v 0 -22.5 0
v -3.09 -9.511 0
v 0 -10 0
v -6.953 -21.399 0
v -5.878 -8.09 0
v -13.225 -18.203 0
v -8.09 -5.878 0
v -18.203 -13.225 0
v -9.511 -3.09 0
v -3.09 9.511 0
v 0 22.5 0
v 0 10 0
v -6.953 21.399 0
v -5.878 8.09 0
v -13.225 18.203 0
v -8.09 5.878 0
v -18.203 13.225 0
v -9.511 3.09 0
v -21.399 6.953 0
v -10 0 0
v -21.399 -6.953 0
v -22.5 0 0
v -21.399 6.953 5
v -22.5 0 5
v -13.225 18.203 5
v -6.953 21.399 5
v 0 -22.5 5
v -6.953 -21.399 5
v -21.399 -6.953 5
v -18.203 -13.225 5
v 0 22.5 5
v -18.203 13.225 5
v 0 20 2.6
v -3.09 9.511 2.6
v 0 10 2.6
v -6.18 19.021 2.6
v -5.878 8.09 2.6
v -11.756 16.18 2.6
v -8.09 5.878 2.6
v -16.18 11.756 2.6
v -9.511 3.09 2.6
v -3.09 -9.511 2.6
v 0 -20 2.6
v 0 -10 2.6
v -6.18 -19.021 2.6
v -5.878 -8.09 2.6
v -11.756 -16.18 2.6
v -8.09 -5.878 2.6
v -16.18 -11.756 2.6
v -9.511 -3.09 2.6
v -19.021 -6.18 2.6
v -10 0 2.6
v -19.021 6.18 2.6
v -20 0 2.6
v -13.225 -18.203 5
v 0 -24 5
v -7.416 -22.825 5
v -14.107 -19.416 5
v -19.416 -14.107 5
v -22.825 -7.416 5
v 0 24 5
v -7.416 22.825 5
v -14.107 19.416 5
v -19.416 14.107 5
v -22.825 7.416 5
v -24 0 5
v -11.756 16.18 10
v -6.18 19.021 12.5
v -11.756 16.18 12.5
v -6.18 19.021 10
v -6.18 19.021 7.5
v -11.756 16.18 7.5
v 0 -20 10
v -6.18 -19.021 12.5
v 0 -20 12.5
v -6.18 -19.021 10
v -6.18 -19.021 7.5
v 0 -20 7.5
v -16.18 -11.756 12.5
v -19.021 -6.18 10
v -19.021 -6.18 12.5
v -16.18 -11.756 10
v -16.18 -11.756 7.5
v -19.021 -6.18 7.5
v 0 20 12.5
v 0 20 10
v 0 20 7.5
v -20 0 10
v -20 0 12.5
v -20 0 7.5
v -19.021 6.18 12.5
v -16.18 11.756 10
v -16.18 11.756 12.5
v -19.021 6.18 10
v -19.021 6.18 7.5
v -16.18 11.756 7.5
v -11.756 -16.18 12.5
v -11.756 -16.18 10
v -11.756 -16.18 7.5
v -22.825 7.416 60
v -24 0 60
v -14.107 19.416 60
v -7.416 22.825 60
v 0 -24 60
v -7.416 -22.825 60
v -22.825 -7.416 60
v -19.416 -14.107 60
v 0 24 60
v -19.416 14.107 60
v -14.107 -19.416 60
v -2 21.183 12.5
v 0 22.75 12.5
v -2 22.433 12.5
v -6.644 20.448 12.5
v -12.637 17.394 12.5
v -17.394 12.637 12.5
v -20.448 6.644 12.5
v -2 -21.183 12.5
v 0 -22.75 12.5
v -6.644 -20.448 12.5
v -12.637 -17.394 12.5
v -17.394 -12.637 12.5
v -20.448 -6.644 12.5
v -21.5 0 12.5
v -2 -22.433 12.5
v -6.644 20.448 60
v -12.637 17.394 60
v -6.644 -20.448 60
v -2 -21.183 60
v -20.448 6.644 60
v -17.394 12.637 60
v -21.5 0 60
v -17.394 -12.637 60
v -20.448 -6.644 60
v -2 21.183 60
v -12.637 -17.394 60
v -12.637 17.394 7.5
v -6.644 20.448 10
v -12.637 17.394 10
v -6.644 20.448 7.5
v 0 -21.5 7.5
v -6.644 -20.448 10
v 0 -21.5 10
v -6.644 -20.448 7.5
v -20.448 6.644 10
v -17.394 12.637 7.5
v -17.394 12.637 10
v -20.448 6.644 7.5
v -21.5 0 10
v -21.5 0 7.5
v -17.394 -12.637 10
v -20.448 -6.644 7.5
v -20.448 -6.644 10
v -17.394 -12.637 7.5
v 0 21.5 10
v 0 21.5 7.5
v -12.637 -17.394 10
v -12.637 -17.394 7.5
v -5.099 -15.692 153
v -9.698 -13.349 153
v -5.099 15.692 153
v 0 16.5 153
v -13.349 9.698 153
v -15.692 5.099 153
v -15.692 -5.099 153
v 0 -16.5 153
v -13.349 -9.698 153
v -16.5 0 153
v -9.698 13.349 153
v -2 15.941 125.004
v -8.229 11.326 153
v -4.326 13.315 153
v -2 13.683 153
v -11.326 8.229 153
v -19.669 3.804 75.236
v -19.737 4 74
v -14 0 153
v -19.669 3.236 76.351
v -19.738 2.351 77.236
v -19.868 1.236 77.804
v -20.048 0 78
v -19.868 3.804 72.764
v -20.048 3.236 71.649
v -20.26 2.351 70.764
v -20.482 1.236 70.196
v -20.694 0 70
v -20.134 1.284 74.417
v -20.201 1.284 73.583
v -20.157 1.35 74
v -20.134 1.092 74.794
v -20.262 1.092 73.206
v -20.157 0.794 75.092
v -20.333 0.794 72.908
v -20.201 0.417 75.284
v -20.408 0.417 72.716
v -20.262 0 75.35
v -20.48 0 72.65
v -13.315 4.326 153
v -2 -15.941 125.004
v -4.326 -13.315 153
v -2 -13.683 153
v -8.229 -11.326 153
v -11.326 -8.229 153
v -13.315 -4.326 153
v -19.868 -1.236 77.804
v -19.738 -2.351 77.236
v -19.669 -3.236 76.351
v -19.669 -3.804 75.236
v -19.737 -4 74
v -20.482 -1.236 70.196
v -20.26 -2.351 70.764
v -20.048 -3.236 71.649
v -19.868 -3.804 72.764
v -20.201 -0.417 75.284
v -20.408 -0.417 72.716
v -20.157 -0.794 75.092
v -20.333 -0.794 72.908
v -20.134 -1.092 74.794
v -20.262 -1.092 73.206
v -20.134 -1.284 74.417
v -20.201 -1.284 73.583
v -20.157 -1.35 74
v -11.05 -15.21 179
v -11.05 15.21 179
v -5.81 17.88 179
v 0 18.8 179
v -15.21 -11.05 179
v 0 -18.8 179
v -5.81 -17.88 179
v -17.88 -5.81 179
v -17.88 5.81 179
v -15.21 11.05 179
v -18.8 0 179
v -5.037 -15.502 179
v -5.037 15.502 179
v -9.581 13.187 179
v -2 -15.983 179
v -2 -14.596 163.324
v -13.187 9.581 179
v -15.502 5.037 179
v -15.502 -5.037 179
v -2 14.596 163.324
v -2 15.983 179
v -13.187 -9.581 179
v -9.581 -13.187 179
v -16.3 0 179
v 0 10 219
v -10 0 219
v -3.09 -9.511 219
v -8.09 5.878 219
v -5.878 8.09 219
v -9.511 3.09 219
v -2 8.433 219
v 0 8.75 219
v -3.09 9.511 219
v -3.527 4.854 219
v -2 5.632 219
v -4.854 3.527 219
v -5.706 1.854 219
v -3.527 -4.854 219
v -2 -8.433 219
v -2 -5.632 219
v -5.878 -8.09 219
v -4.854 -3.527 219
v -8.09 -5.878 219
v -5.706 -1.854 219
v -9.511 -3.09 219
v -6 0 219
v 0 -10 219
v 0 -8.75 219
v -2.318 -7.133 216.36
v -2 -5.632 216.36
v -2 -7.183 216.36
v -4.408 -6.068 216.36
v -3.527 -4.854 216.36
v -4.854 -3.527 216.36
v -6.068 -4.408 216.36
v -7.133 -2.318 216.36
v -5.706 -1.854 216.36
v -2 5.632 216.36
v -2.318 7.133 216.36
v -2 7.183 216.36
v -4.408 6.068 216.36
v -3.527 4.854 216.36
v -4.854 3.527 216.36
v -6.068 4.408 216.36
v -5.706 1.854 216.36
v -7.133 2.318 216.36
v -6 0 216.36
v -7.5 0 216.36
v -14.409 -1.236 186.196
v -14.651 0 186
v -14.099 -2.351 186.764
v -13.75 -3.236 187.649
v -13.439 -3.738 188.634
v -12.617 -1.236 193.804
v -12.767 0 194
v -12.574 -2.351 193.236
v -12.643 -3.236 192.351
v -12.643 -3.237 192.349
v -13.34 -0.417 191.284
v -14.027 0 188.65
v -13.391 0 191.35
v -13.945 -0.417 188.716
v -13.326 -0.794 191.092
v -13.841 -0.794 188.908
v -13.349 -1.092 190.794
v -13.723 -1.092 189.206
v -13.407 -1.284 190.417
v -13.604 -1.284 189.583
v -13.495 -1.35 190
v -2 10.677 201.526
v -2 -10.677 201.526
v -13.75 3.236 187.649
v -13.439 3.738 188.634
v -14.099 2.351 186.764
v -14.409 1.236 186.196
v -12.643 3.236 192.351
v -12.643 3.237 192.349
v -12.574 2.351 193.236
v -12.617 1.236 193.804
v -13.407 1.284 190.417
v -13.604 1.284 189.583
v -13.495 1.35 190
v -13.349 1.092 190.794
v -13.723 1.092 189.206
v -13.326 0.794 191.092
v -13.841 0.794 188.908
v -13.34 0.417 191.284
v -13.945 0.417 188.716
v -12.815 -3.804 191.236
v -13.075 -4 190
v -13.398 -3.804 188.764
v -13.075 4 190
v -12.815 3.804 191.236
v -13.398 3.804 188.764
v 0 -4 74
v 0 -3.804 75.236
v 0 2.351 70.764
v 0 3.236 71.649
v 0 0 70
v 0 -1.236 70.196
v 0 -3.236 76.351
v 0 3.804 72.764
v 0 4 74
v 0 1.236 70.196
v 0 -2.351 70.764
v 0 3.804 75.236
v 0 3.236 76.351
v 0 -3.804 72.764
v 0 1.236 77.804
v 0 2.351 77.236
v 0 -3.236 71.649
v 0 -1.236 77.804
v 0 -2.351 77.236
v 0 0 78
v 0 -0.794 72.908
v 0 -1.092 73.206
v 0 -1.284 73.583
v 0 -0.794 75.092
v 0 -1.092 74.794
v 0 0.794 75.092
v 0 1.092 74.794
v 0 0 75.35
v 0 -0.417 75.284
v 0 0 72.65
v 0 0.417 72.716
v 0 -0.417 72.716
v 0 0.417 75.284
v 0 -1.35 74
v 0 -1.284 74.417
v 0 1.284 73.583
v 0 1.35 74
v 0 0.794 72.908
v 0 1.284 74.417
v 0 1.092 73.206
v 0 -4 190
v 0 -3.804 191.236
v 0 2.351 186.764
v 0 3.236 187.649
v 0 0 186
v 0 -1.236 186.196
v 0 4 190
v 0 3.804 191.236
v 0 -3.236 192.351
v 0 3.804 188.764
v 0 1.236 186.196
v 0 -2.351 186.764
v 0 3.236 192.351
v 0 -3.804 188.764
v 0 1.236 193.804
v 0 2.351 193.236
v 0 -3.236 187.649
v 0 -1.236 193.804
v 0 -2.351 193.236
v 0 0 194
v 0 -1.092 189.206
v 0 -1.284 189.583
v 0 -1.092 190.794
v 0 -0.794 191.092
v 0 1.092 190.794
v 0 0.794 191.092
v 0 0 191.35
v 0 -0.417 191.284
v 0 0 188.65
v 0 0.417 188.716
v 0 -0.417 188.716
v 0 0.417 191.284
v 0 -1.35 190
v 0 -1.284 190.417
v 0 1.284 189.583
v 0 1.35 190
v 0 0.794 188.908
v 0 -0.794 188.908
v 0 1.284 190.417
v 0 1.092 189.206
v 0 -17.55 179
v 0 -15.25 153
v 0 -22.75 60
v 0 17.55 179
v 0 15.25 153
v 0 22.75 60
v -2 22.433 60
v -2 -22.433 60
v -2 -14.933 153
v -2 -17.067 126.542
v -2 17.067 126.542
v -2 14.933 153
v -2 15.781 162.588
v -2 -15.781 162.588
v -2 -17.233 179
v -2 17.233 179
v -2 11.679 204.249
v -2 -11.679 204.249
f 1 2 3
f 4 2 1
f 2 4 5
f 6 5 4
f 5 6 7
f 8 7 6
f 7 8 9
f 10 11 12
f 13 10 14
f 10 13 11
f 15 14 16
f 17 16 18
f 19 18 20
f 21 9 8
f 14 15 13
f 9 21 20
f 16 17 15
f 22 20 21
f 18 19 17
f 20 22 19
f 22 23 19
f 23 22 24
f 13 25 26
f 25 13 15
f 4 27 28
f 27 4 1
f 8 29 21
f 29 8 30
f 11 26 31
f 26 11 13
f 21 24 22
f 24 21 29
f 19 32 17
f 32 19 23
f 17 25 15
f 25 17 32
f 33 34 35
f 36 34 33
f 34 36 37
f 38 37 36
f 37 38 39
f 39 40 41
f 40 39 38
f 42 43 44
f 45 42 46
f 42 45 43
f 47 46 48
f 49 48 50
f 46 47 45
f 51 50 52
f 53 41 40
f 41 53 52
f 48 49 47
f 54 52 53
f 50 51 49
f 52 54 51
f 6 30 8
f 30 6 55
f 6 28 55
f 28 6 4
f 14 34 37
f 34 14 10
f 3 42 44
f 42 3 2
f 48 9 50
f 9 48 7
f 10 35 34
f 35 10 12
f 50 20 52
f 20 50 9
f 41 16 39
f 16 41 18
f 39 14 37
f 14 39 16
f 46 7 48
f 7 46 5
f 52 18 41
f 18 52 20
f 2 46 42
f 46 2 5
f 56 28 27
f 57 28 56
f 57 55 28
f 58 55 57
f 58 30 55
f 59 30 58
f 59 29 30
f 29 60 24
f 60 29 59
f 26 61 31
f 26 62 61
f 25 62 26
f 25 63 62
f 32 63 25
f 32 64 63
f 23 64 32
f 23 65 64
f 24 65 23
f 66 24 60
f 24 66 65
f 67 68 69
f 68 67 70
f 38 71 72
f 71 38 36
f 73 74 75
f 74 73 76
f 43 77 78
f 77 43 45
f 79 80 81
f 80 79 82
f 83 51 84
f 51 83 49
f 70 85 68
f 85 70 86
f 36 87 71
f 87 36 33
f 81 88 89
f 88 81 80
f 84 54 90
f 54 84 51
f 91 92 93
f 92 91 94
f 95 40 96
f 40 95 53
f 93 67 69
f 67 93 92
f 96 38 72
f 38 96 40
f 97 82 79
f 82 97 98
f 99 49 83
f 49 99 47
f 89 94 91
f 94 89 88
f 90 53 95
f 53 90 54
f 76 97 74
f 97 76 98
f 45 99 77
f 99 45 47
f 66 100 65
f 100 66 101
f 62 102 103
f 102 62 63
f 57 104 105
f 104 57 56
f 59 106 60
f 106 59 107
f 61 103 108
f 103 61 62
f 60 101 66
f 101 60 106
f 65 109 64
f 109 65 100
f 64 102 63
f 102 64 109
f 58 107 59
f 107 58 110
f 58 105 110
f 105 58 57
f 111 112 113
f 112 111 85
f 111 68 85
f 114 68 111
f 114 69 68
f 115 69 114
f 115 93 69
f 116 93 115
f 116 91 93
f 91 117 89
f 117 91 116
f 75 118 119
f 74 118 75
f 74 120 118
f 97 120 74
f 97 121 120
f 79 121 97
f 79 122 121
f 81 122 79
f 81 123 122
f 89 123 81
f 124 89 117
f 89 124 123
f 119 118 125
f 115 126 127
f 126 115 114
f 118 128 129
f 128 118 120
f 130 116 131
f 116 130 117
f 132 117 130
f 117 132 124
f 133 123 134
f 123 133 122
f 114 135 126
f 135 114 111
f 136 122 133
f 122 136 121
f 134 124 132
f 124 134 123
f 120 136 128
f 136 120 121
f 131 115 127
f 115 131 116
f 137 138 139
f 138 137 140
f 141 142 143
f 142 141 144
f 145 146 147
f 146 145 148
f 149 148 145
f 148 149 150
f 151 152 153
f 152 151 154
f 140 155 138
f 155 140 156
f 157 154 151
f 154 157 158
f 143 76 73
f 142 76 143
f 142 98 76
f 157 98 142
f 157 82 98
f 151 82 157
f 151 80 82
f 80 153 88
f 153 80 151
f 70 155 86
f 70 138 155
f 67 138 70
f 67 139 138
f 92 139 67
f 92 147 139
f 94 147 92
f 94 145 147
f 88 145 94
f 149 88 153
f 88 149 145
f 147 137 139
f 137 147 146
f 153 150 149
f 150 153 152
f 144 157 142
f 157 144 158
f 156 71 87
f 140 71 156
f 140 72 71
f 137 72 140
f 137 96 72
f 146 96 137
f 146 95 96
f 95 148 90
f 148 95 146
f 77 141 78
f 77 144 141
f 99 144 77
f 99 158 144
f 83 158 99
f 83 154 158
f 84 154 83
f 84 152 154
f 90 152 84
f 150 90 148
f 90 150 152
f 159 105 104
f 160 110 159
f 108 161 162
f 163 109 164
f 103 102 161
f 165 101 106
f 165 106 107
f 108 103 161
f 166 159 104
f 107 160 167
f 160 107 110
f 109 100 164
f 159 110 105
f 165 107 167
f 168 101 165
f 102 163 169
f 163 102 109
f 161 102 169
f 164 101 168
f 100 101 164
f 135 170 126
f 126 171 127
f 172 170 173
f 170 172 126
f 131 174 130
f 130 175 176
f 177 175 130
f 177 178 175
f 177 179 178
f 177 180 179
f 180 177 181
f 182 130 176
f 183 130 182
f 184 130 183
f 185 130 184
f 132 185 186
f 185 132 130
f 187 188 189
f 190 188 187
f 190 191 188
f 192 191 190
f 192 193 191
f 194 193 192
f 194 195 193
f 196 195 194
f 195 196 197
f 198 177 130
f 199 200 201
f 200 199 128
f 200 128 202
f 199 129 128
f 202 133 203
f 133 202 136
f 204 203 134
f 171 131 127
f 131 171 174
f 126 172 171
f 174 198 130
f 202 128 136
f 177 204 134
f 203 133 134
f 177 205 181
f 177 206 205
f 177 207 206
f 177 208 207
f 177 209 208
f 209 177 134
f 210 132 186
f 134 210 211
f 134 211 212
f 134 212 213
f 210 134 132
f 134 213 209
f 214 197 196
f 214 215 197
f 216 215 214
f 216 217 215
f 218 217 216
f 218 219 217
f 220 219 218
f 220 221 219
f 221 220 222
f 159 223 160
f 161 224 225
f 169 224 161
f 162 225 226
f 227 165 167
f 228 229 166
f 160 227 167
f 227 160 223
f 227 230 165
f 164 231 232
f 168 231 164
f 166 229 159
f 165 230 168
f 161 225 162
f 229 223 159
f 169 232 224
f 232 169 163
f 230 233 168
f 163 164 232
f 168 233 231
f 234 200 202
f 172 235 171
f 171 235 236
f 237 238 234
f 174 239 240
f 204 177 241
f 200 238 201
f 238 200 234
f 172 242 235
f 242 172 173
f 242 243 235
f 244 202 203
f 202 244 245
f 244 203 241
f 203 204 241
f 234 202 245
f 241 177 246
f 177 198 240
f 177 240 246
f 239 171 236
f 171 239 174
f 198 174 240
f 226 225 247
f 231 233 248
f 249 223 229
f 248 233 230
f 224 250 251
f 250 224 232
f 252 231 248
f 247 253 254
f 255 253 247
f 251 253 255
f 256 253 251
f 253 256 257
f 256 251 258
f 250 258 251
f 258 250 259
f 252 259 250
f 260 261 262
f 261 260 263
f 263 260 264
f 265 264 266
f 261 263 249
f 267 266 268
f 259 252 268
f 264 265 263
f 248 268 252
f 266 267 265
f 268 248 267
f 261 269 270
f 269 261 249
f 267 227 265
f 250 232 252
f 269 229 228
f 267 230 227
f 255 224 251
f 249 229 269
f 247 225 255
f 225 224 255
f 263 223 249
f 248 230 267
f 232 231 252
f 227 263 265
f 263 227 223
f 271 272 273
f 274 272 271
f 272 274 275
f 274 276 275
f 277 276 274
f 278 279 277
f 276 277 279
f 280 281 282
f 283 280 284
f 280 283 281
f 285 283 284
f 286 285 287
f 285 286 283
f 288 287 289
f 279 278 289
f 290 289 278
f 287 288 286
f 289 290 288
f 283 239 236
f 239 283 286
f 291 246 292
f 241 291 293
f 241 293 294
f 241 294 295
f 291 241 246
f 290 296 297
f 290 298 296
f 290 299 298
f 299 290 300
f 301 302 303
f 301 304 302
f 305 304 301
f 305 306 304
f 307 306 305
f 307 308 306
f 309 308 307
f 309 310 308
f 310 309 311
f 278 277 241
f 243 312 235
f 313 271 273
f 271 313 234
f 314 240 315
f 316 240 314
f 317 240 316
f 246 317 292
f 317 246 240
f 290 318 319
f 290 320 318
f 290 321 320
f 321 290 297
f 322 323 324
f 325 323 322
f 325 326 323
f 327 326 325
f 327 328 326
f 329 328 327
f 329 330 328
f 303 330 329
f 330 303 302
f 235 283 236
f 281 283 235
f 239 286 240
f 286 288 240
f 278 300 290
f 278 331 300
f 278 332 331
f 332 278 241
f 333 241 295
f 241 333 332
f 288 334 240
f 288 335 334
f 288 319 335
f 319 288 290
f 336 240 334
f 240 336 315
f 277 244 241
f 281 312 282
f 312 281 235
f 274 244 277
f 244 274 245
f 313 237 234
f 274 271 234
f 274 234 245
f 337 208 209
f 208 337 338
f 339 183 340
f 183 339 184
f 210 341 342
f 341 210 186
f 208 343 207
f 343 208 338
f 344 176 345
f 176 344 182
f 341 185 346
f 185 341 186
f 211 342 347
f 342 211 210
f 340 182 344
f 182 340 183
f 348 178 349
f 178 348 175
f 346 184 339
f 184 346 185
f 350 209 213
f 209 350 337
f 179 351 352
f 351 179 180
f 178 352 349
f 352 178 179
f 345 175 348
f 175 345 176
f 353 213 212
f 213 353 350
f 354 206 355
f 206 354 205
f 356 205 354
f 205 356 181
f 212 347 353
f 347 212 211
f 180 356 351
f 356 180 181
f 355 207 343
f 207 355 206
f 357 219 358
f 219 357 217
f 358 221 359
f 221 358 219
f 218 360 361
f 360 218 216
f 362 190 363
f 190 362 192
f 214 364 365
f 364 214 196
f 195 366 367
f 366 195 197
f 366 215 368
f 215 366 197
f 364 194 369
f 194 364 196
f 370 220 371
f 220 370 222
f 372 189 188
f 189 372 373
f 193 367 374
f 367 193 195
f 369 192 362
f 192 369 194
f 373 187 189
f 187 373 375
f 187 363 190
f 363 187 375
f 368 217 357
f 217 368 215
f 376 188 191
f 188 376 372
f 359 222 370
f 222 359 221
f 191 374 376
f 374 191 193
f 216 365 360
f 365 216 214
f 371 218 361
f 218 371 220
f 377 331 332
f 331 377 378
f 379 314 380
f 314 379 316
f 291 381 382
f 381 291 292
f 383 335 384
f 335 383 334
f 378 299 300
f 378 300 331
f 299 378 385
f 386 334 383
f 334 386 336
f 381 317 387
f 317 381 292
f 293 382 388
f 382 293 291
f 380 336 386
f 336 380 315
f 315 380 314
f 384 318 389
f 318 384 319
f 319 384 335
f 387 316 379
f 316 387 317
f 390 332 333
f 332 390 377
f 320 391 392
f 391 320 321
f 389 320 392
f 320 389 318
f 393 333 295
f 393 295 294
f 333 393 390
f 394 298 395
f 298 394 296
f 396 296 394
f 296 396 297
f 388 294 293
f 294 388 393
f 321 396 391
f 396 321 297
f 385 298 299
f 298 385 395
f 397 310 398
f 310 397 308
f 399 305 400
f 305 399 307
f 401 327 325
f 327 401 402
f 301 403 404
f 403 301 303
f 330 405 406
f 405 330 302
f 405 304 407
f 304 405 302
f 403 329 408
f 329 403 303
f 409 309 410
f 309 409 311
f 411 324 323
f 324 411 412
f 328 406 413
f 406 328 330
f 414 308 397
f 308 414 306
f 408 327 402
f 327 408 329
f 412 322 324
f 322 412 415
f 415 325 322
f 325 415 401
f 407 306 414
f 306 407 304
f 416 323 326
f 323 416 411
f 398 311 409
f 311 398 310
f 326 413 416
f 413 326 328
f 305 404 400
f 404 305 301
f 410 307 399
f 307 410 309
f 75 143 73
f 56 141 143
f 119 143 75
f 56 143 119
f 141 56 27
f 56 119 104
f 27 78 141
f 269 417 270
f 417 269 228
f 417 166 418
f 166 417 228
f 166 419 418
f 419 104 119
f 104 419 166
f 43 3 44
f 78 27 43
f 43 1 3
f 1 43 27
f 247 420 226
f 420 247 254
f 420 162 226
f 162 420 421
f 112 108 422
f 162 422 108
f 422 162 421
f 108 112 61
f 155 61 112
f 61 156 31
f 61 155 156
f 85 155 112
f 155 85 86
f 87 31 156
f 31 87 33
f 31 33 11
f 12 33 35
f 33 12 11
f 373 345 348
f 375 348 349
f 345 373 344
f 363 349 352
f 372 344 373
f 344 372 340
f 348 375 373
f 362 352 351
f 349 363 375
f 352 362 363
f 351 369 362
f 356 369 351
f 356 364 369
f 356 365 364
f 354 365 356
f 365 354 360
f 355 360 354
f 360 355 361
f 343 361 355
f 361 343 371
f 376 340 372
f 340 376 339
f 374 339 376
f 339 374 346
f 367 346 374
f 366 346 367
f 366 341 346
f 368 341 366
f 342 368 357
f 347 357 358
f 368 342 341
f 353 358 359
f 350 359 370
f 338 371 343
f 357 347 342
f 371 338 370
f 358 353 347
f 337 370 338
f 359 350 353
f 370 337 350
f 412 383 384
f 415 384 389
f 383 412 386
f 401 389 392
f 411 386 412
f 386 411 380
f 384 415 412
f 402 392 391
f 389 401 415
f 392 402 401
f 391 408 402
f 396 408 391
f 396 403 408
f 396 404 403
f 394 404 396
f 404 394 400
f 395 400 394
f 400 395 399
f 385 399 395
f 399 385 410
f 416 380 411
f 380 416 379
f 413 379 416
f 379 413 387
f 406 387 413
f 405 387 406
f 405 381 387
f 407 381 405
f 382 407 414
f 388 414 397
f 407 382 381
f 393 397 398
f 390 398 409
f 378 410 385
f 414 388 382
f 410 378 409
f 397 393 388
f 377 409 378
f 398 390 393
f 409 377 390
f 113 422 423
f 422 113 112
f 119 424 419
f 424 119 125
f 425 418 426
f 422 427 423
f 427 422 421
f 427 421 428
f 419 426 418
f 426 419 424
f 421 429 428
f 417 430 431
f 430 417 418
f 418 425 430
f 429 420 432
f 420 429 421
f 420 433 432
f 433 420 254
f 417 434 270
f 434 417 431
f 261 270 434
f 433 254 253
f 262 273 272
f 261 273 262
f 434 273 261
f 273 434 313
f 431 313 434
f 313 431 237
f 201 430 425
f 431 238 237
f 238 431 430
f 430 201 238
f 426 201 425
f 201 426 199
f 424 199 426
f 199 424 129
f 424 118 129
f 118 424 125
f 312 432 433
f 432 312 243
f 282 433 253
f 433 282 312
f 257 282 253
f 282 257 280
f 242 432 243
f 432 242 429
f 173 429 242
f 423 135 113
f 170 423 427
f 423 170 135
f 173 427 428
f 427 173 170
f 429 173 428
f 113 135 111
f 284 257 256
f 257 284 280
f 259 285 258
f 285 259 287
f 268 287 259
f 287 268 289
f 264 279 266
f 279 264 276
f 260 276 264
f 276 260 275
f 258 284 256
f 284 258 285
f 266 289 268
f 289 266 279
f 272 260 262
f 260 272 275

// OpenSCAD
// How to make things smoother:
// <kintel> Traditionally, the easiest way is to draw half the outline in SVG and rotate_extrude() it in OpenSCAD
// <kintel> you can also do interesting tricks using offset(), but again, that needs to be done in 2D space
// <kintel> ..or finally, minkowski() {your_model(); sphere();} is often a decent trick

$fn = 20;
wall_thickness = 2.5;

motor_shaft_cutout_width = 2.6;
motor_shaft_cutout_radius = 10;

aluminium_ring_section_with = 5;
aluminium_ring_section_radius = 22.5;
aluminium_ring_section_inner_overlap = 2.5;

top_radius = 24;
top_width = 55;

motor_anchor_width = 7.5;
motor_anchor_slit_width = 2.5;
motor_anchor_slit_offeset = 2.5;

grip_cone_width = 93;
grip_cone_bottom_radius = 16.5;

middle_section_cone_width = 26;
middle_section_cone_radius = 18.8; 

bottom_section_cone_width = 40;
bottom_section_cone_radius = 10;

bottom_opening_width = 2.64;
bottom_opening_radius = 6;

button_radius = 8;
button_offset = 95;
button_gap = 17;
button_count = 3;

button_half = false;


screw_holder_radius = 4;
screw_holder_inner_radius = 1.35;

top_screw_holder_heigth = 11;
top_screw_holder_offset = 74;

pcb_screw_holder_z_offset = 150;
pcb_screw_holder_x_offset = -16;

bottom_screw_holder_z_offset = 190;
bottom_screw_holder_x_offset = -15;

difference() {
    union() {
        difference() {
            union() {
                difference() {
                    union() {
                        difference() { // Front plate with motor shaft cutout
                            cylinder(h=motor_shaft_cutout_width, r=aluminium_ring_section_radius);
                            cylinder(h=motor_shaft_cutout_width, r=motor_shaft_cutout_radius);
                        }
                        difference() { // Motor rubber ring cutout
                            translate([0,0,motor_shaft_cutout_width]) cylinder(h=aluminium_ring_section_with - motor_shaft_cutout_width, r=aluminium_ring_section_radius);
                            translate([0,0,motor_shaft_cutout_width]) cylinder(h=aluminium_ring_section_with - motor_shaft_cutout_width, r=aluminium_ring_section_radius - wall_thickness);
                        }
                        difference() { // Top section
                            translate([0,0,aluminium_ring_section_with]) cylinder(h=top_width, r=top_radius);
                            translate([0,0,aluminium_ring_section_with]) cylinder(h=motor_anchor_width, r=aluminium_ring_section_radius - wall_thickness);
                            translate([0,0,aluminium_ring_section_with + motor_anchor_width]) cylinder(h=top_width - motor_anchor_width, r=top_radius - wall_thickness);
                            translate([0,0,aluminium_ring_section_with + motor_anchor_slit_offeset]) cylinder(h=motor_anchor_slit_width, r=top_radius - wall_thickness);
                        }
                        difference() { // Grip cone
                            translate([0,0,aluminium_ring_section_with + top_width]) cylinder(h=grip_cone_width, r1=top_radius, r2=grip_cone_bottom_radius);
                            translate([0,0,aluminium_ring_section_with + top_width]) cylinder(h=grip_cone_width, r1=top_radius - wall_thickness, r2=grip_cone_bottom_radius - wall_thickness);
                        }
                        difference() { // Middle section cone
                            translate([0,0,aluminium_ring_section_with + top_width + grip_cone_width]) cylinder(h=middle_section_cone_width, r1=grip_cone_bottom_radius, r2=middle_section_cone_radius);
                            translate([0,0,aluminium_ring_section_with + top_width + grip_cone_width]) cylinder(h=middle_section_cone_width, r1=grip_cone_bottom_radius - wall_thickness, r2=middle_section_cone_radius - wall_thickness);
                        }
                        difference() { // Bottom section cone
                            translate([0,0,aluminium_ring_section_with + top_width + grip_cone_width + middle_section_cone_width]) cylinder(h=bottom_section_cone_width, r1=middle_section_cone_radius, r2 = bottom_section_cone_radius);
                            translate([0,0,aluminium_ring_section_with + top_width + grip_cone_width + middle_section_cone_width]) cylinder(h=bottom_section_cone_width - bottom_opening_width, r1=middle_section_cone_radius - wall_thickness, r2 = bottom_section_cone_radius - wall_thickness);
                        }
                        if(button_half) { // Screw holders for button half
                            difference() {
                                translate([0 - top_radius + wall_thickness, 0, top_screw_holder_offset]) rotate([0,90,0]) cylinder(h=top_screw_holder_heigth, r=screw_holder_radius);
                                translate([0 - top_radius + wall_thickness, 0, top_screw_holder_offset]) rotate([0,90,0]) cylinder(h=top_screw_holder_heigth, r=screw_holder_inner_radius);
                            }
                            difference() {
                                translate([pcb_screw_holder_x_offset, 0, pcb_screw_holder_z_offset]) rotate([0,90,0]) cylinder(h=top_screw_holder_heigth, r=screw_holder_radius);
                                translate([pcb_screw_holder_x_offset, 0, pcb_screw_holder_z_offset]) rotate([0,90,0]) cylinder(h=top_screw_holder_heigth, r=screw_holder_inner_radius);
                            }
                            difference() {
                                translate([bottom_screw_holder_x_offset, 0, bottom_screw_holder_z_offset]) rotate([0,90,0]) cylinder(h=top_screw_holder_heigth, r=screw_holder_radius);
                                translate([bottom_screw_holder_x_offset, 0, bottom_screw_holder_z_offset]) rotate([0,90,0]) cylinder(h=top_screw_holder_heigth, r=screw_holder_inner_radius);
                            }
                        } else { // Screw holders for other half
                            difference() {
                                translate([0 - top_radius + wall_thickness, 0, top_screw_holder_offset]) rotate([0,90,0]) cylinder(h=top_radius + wall_thickness, r=screw_holder_radius);
                                translate([0 - top_radius + wall_thickness, 0, top_screw_holder_offset]) rotate([0,90,0]) cylinder(h=top_radius + wall_thickness, r=screw_holder_inner_radius);
                            }
                            difference() {
                                translate([bottom_screw_holder_x_offset, 0, bottom_screw_holder_z_offset]) rotate([0,90,0]) cylinder(h=top_radius + wall_thickness, r=screw_holder_radius);
                                translate([bottom_screw_holder_x_offset, 0, bottom_screw_holder_z_offset]) rotate([0,90,0]) cylinder(h=top_radius + wall_thickness, r=screw_holder_inner_radius);
                            }
                        }
                    }
                    
                    // Holes for the buttons
                    if(button_half) {
                        for (i = [0 : button_count - 1]) {
                            button_z = button_offset + button_radius + i * button_gap;
                            translate([0 - top_radius, 0, button_z]) rotate([0,90,0])  cylinder(h=30, r=button_radius);
                        }

                    }
                }
                if(button_half) { // inner button ridges
                    for (i = [0 : button_count - 1]) {
                            button_z = button_offset + button_radius + i * button_gap;
                            grip_cone_z = aluminium_ring_section_with + top_width;
                            grip_cone_z2 = aluminium_ring_section_with + top_width + grip_cone_width;

                            button_percent = (button_z - grip_cone_z) / (grip_cone_z2 - grip_cone_z);
                            button_x_offset = top_radius - ((top_radius - grip_cone_bottom_radius) * button_percent);
                            difference() {
                                translate([0 - button_x_offset + 1, 0, button_z]) rotate([0,90,0])  cylinder(h=4, r=button_radius + 1);
                                translate([0 - button_x_offset - 5, 0, button_z]) rotate([0,90,0])  cylinder(h=60, r=button_radius);
                            }
                    }

                }
            }

            translate([0, -30, 0]) cube([30, 60, 1000]); // cut in half for easier modelling
        }
        if(button_half) { // connection ridge on the inside for button half
            difference() {
                union() {
                    difference() { // top section
                        translate([0,0,aluminium_ring_section_with + motor_anchor_width]) cylinder(h=top_width - motor_anchor_width, r=top_radius - (wall_thickness / 2));
                        translate([0,0,aluminium_ring_section_with + motor_anchor_width]) cylinder(h=motor_anchor_width, r=aluminium_ring_section_radius - wall_thickness);
                        translate([0,0,aluminium_ring_section_with + (motor_anchor_width * 2)]) cylinder(h=top_width - (motor_anchor_width * 2), r=top_radius - wall_thickness);
                    }
                    difference() { // grip cone
                        translate([0,0,aluminium_ring_section_with + top_width]) cylinder(h=grip_cone_width, r1=top_radius - (wall_thickness / 2), r2=grip_cone_bottom_radius - (wall_thickness / 2));
                        translate([0,0,aluminium_ring_section_with + top_width]) cylinder(h=grip_cone_width, r1=top_radius - wall_thickness, r2=grip_cone_bottom_radius - wall_thickness);
                    }
                    difference() { // middle section cone
                        translate([0,0,aluminium_ring_section_with + top_width + grip_cone_width]) cylinder(h=middle_section_cone_width, r1=grip_cone_bottom_radius - (wall_thickness / 2), r2=middle_section_cone_radius - (wall_thickness / 2));
                        translate([0,0,aluminium_ring_section_with + top_width + grip_cone_width]) cylinder(h=middle_section_cone_width, r1=grip_cone_bottom_radius - wall_thickness, r2=middle_section_cone_radius - wall_thickness);
                    }
                    difference() { // bottom section cone
                        translate([0,0,aluminium_ring_section_with + top_width + grip_cone_width + middle_section_cone_width]) cylinder(h=bottom_section_cone_width, r1=middle_section_cone_radius - (wall_thickness / 2), r2 = bottom_section_cone_radius - (wall_thickness / 2));
                        translate([0,0,aluminium_ring_section_with + top_width + grip_cone_width + middle_section_cone_width]) cylinder(h=bottom_section_cone_width - bottom_opening_width, r1=middle_section_cone_radius - wall_thickness, r2 = bottom_section_cone_radius - wall_thickness);
                    }
                }
                translate([-32, -30, 0]) cube([30, 60, 1000]); // cut in half
            }
        }   
    }
    if(!button_half) { // connection ridge on the outside for other half
        difference() {
            union() {
                difference() { // top section
                    translate([0,0,aluminium_ring_section_with + motor_anchor_width]) cylinder(h=top_width - motor_anchor_width, r=top_radius - (wall_thickness / 2));
                    translate([0,0,aluminium_ring_section_with + motor_anchor_width]) cylinder(h=motor_anchor_width, r=aluminium_ring_section_radius - wall_thickness);
                    translate([0,0,aluminium_ring_section_with + (motor_anchor_width * 2)]) cylinder(h=top_width - (motor_anchor_width * 2), r=top_radius - wall_thickness);
                }
                difference() { // grip cone
                    translate([0,0,aluminium_ring_section_with + top_width]) cylinder(h=grip_cone_width, r1=top_radius - (wall_thickness / 2), r2=grip_cone_bottom_radius - (wall_thickness / 2));
                    translate([0,0,aluminium_ring_section_with + top_width]) cylinder(h=grip_cone_width, r1=top_radius - wall_thickness, r2=grip_cone_bottom_radius - wall_thickness);
                }
                difference() { // middle section cone
                    translate([0,0,aluminium_ring_section_with + top_width + grip_cone_width]) cylinder(h=middle_section_cone_width, r1=grip_cone_bottom_radius - (wall_thickness / 2), r2=middle_section_cone_radius - (wall_thickness / 2));
                    translate([0,0,aluminium_ring_section_with + top_width + grip_cone_width]) cylinder(h=middle_section_cone_width, r1=grip_cone_bottom_radius - wall_thickness, r2=middle_section_cone_radius - wall_thickness);
                }
                difference() { // bottom section cone
                    translate([0,0,aluminium_ring_section_with + top_width + grip_cone_width + middle_section_cone_width]) cylinder(h=bottom_section_cone_width, r1=middle_section_cone_radius - (wall_thickness / 2), r2 = bottom_section_cone_radius - (wall_thickness / 2));
                    translate([0,0,aluminium_ring_section_with + top_width + grip_cone_width + middle_section_cone_width]) cylinder(h=bottom_section_cone_width - bottom_opening_width, r1=middle_section_cone_radius - wall_thickness, r2 = bottom_section_cone_radius - wall_thickness);
                }
            }
            translate([-32, -30, 0]) cube([30, 60, 1000]); // cut in half
        }
    }   
    translate([0,0,aluminium_ring_section_with + top_width + grip_cone_width + middle_section_cone_width + bottom_section_cone_width - bottom_opening_width]) cylinder(h=bottom_opening_width, r=bottom_opening_radius); // cable cutout
    translate([1, -30, 0]) cube([30, 60, 1000]); // cut in half
}
